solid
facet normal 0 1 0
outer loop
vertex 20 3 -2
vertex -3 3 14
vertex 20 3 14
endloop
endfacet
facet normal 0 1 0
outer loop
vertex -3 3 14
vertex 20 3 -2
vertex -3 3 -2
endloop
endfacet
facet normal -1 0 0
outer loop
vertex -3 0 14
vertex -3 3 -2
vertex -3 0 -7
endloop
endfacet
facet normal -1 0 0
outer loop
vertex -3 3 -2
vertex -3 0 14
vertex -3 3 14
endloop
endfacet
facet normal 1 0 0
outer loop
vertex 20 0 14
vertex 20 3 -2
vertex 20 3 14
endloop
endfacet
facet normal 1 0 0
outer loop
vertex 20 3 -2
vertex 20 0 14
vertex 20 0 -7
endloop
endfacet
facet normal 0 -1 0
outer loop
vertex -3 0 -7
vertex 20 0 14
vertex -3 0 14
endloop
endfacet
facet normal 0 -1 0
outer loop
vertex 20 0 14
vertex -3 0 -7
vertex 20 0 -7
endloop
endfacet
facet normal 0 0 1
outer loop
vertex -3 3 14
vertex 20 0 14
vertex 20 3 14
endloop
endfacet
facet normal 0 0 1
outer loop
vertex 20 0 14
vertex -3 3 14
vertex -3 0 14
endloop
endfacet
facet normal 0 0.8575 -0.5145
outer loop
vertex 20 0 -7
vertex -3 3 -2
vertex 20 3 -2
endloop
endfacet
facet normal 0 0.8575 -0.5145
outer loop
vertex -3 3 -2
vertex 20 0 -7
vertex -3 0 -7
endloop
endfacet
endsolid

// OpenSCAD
module hook(arm_length=1, arm_thickness=16, hook_length=5, hook_thickness=3, hook_width=23, gap_size=3) {
    // Arm
    translate([0, -arm_thickness, 0])
    cube([arm_length, arm_thickness, hook_width]);

    // Small block
    translate([0, -16, 0])
    cube([hook_thickness, 16-gap_size, hook_width]);

    // Hook
    translate([0, 0, 0])
    linear_extrude(height = hook_width)
    polygon([[0, hook_length], [0, 0], [hook_thickness, 0]]);
}

// Wrapper module that applies transformations
module mounted_hook(gap_size=3) {
    translate([20, 0, -2])
    rotate([90, 180, 270])
    hook(gap_size);
}

// Call the new module
mounted_hook();
